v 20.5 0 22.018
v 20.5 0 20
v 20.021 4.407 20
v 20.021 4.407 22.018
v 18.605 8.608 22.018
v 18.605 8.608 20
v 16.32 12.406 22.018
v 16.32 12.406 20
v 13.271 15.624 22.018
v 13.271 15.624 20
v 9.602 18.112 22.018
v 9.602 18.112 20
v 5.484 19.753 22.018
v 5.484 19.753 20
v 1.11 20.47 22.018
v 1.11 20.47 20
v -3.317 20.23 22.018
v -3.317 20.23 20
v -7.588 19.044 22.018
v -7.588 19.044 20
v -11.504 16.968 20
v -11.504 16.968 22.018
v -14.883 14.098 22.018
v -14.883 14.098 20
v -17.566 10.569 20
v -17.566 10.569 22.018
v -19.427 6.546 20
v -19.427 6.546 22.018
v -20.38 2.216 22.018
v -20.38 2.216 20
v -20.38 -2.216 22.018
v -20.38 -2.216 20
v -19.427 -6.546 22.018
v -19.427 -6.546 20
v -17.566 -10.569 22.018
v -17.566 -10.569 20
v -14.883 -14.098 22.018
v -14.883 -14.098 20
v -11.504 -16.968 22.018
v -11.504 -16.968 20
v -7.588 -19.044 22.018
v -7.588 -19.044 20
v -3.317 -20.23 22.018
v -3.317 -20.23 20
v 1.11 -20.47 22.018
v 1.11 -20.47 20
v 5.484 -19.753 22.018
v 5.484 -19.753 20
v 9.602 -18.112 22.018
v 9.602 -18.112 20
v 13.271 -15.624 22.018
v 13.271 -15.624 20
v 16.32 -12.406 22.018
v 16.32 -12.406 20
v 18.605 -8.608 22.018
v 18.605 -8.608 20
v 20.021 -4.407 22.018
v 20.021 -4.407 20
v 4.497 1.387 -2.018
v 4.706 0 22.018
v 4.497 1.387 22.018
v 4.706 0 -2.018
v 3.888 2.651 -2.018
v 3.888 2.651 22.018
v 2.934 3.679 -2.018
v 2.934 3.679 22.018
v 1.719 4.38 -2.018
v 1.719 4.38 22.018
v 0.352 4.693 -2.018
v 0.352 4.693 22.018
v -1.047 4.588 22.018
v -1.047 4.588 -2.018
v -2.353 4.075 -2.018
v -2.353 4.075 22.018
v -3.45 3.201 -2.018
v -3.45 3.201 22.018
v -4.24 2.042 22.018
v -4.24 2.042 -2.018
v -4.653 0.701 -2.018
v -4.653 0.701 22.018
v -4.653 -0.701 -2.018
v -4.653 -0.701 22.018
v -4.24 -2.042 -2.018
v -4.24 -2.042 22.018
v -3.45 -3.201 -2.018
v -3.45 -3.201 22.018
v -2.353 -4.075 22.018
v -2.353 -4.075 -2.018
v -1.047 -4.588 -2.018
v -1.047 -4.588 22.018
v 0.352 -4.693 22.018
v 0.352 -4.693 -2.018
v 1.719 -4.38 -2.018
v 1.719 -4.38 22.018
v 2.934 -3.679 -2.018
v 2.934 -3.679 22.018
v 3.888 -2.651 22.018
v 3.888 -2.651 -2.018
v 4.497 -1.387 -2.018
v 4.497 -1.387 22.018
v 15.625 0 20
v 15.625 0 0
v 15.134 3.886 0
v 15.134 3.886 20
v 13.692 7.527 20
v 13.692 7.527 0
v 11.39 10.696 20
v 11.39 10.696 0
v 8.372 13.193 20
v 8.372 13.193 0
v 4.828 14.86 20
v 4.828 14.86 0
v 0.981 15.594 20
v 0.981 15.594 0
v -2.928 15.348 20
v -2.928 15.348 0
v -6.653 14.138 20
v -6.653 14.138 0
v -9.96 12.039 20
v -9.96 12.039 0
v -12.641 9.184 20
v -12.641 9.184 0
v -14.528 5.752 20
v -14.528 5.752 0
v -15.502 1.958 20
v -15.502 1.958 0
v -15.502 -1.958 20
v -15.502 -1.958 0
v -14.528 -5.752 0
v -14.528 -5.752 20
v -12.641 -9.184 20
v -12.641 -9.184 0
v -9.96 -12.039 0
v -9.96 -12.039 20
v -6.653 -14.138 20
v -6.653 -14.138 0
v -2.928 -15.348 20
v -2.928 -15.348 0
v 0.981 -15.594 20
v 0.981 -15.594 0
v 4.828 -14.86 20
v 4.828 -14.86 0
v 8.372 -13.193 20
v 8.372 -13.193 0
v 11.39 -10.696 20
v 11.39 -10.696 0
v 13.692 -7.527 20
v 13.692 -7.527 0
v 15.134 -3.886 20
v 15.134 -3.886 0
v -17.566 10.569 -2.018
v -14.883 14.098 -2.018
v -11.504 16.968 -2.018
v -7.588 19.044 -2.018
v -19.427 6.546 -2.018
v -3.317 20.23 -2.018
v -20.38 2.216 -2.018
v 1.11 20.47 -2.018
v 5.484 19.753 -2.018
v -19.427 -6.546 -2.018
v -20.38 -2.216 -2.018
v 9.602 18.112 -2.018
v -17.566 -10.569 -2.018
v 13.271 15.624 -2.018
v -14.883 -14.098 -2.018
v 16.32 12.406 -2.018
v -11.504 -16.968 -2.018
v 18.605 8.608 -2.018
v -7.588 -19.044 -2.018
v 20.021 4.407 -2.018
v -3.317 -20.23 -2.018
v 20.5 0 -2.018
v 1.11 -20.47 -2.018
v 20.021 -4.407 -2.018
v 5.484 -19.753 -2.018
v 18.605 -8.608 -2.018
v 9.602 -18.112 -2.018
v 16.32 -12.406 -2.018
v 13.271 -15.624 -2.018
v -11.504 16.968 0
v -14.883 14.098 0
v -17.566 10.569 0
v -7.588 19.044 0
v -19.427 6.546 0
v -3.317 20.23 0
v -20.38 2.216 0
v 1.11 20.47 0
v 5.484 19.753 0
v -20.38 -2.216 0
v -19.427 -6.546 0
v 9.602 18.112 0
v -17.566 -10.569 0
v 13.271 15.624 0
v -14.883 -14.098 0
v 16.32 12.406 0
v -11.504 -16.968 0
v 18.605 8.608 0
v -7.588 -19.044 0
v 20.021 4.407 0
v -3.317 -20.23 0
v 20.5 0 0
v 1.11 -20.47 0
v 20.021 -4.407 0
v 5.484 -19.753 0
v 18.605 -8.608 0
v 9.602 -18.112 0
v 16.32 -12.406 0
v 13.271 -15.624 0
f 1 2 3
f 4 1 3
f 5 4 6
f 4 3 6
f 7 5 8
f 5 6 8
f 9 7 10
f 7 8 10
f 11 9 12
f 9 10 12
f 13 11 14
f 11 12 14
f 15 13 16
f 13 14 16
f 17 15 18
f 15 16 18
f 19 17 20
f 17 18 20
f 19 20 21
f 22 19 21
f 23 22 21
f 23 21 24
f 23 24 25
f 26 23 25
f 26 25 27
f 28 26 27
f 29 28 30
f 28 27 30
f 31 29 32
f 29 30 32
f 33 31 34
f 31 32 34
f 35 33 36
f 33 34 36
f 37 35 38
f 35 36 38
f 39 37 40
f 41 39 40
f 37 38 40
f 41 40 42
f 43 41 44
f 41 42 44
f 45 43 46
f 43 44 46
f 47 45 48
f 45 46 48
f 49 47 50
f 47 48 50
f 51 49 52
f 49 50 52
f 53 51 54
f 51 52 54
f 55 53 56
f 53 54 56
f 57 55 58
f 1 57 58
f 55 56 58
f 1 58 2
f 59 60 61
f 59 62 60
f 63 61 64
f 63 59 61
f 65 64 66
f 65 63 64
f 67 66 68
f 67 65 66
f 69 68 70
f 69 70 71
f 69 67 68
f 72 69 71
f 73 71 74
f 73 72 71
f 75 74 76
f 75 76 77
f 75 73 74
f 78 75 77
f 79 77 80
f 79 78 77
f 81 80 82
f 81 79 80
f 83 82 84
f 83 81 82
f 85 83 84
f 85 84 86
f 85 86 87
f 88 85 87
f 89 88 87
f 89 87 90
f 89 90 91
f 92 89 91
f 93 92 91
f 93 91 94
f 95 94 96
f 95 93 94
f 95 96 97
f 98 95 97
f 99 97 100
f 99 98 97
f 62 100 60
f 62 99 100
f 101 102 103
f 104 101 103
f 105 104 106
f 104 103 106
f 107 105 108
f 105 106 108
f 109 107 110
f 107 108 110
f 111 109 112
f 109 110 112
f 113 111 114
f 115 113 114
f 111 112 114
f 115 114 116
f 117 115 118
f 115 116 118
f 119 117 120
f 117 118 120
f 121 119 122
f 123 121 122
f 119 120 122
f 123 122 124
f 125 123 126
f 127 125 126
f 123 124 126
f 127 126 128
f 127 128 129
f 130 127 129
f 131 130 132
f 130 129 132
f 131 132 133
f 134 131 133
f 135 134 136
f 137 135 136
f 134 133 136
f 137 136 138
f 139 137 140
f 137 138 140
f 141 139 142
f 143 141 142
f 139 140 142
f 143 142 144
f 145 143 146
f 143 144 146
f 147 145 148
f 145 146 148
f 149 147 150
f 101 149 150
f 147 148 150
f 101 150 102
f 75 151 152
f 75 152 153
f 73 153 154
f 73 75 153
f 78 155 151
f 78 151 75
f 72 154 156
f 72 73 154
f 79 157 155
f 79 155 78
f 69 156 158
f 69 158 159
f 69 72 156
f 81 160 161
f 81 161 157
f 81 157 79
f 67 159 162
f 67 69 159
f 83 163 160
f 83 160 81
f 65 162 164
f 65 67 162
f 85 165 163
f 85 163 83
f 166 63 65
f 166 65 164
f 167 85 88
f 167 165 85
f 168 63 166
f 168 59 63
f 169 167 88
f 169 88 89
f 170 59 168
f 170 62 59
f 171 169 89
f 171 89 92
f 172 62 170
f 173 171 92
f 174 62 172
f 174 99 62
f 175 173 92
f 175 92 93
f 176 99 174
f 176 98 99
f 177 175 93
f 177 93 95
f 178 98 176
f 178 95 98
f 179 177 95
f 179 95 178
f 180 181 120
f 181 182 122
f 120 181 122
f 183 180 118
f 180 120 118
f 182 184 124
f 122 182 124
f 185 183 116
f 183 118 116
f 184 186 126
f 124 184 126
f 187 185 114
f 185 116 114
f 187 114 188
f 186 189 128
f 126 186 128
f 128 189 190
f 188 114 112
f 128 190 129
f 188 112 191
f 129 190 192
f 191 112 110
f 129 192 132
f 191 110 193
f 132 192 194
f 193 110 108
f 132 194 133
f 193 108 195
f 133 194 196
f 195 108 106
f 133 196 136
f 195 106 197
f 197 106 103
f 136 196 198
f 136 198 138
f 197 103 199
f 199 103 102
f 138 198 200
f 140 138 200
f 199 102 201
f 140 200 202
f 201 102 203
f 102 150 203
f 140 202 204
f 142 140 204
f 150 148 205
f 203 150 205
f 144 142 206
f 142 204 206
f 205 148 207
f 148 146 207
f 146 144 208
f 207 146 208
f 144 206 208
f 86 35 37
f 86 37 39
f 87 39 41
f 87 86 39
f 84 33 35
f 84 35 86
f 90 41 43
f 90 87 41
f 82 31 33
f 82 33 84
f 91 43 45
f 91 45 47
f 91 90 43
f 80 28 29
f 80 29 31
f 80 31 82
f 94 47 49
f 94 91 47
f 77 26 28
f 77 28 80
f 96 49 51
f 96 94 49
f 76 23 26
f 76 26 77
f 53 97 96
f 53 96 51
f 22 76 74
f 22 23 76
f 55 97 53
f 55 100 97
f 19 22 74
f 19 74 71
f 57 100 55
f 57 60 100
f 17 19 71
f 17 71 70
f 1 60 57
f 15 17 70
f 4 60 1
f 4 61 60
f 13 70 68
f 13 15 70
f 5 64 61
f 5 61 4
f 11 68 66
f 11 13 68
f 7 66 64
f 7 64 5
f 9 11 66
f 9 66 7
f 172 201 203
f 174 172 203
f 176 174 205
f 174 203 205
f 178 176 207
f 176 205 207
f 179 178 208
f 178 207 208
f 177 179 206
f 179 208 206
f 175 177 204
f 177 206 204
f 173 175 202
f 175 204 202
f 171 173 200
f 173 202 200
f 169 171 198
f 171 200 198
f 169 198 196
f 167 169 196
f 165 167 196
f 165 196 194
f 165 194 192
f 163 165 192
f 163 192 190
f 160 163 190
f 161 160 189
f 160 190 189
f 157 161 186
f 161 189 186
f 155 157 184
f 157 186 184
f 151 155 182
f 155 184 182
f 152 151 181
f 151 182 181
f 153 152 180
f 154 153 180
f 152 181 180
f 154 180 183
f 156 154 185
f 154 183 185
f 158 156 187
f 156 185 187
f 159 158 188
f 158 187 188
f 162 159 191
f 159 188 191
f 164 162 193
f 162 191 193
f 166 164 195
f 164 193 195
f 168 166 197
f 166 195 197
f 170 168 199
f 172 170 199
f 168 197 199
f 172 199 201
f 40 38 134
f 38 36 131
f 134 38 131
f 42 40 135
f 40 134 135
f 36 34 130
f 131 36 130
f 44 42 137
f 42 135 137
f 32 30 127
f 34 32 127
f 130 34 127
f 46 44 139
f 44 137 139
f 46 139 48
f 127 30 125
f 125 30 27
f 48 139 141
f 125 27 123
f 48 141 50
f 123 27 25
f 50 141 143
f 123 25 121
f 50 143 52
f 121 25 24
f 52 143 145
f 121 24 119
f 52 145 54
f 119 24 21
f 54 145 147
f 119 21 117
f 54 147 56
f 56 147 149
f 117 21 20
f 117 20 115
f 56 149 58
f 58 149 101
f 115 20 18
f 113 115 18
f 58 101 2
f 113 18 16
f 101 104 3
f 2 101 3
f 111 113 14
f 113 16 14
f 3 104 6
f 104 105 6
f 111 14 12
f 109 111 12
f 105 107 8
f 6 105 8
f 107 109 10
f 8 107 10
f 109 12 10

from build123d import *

# Parameters (mm, degrees)
F0_R          = 15.625
F0_R_2        = 5.715
F1_DEPTH      = 20
F2_R          = 5.715
F2_R_2        = 4.70576
F3_DEPTH      = 2.01848
F3_DEPTH_BACK = 22.01848
F4_R          = 20.5
F4_R_2        = 5.715
F5_DEPTH      = 2.01848
F6_R          = 20.5
F6_R_2        = 5.715
F7_DEPTH      = 2.01848


with BuildPart() as f1:
    # F0 (on Top) → F1 (new body)
    with BuildSketch(Plane.XY):
        Circle(F0_R)
        Circle(F0_R_2, mode=Mode.SUBTRACT)
    extrude(amount=F1_DEPTH)

    # F2 (on face) → F3 (join, two sides)
    with BuildSketch(Plane.XY.offset(20)) as f3_sk:
        Circle(F2_R)
        Circle(F2_R_2, mode=Mode.SUBTRACT)
    extrude(amount=F3_DEPTH)
    extrude(f3_sk.sketch, amount=-F3_DEPTH_BACK)

    # F4 (on face) → F5 (join)
    with BuildSketch(Plane.XY.offset(20)):
        Circle(F4_R)
        Circle(F4_R_2, mode=Mode.SUBTRACT)
    extrude(amount=F5_DEPTH)

    # F6 (on face) → F7 (join)
    with BuildSketch(Plane(origin=(0, 0, 0), x_dir=(1, 0, 0), z_dir=(0, 0, -1))):
        Circle(F6_R)
        Circle(F6_R_2, mode=Mode.SUBTRACT)
    extrude(amount=F7_DEPTH)


solid = f1.part
